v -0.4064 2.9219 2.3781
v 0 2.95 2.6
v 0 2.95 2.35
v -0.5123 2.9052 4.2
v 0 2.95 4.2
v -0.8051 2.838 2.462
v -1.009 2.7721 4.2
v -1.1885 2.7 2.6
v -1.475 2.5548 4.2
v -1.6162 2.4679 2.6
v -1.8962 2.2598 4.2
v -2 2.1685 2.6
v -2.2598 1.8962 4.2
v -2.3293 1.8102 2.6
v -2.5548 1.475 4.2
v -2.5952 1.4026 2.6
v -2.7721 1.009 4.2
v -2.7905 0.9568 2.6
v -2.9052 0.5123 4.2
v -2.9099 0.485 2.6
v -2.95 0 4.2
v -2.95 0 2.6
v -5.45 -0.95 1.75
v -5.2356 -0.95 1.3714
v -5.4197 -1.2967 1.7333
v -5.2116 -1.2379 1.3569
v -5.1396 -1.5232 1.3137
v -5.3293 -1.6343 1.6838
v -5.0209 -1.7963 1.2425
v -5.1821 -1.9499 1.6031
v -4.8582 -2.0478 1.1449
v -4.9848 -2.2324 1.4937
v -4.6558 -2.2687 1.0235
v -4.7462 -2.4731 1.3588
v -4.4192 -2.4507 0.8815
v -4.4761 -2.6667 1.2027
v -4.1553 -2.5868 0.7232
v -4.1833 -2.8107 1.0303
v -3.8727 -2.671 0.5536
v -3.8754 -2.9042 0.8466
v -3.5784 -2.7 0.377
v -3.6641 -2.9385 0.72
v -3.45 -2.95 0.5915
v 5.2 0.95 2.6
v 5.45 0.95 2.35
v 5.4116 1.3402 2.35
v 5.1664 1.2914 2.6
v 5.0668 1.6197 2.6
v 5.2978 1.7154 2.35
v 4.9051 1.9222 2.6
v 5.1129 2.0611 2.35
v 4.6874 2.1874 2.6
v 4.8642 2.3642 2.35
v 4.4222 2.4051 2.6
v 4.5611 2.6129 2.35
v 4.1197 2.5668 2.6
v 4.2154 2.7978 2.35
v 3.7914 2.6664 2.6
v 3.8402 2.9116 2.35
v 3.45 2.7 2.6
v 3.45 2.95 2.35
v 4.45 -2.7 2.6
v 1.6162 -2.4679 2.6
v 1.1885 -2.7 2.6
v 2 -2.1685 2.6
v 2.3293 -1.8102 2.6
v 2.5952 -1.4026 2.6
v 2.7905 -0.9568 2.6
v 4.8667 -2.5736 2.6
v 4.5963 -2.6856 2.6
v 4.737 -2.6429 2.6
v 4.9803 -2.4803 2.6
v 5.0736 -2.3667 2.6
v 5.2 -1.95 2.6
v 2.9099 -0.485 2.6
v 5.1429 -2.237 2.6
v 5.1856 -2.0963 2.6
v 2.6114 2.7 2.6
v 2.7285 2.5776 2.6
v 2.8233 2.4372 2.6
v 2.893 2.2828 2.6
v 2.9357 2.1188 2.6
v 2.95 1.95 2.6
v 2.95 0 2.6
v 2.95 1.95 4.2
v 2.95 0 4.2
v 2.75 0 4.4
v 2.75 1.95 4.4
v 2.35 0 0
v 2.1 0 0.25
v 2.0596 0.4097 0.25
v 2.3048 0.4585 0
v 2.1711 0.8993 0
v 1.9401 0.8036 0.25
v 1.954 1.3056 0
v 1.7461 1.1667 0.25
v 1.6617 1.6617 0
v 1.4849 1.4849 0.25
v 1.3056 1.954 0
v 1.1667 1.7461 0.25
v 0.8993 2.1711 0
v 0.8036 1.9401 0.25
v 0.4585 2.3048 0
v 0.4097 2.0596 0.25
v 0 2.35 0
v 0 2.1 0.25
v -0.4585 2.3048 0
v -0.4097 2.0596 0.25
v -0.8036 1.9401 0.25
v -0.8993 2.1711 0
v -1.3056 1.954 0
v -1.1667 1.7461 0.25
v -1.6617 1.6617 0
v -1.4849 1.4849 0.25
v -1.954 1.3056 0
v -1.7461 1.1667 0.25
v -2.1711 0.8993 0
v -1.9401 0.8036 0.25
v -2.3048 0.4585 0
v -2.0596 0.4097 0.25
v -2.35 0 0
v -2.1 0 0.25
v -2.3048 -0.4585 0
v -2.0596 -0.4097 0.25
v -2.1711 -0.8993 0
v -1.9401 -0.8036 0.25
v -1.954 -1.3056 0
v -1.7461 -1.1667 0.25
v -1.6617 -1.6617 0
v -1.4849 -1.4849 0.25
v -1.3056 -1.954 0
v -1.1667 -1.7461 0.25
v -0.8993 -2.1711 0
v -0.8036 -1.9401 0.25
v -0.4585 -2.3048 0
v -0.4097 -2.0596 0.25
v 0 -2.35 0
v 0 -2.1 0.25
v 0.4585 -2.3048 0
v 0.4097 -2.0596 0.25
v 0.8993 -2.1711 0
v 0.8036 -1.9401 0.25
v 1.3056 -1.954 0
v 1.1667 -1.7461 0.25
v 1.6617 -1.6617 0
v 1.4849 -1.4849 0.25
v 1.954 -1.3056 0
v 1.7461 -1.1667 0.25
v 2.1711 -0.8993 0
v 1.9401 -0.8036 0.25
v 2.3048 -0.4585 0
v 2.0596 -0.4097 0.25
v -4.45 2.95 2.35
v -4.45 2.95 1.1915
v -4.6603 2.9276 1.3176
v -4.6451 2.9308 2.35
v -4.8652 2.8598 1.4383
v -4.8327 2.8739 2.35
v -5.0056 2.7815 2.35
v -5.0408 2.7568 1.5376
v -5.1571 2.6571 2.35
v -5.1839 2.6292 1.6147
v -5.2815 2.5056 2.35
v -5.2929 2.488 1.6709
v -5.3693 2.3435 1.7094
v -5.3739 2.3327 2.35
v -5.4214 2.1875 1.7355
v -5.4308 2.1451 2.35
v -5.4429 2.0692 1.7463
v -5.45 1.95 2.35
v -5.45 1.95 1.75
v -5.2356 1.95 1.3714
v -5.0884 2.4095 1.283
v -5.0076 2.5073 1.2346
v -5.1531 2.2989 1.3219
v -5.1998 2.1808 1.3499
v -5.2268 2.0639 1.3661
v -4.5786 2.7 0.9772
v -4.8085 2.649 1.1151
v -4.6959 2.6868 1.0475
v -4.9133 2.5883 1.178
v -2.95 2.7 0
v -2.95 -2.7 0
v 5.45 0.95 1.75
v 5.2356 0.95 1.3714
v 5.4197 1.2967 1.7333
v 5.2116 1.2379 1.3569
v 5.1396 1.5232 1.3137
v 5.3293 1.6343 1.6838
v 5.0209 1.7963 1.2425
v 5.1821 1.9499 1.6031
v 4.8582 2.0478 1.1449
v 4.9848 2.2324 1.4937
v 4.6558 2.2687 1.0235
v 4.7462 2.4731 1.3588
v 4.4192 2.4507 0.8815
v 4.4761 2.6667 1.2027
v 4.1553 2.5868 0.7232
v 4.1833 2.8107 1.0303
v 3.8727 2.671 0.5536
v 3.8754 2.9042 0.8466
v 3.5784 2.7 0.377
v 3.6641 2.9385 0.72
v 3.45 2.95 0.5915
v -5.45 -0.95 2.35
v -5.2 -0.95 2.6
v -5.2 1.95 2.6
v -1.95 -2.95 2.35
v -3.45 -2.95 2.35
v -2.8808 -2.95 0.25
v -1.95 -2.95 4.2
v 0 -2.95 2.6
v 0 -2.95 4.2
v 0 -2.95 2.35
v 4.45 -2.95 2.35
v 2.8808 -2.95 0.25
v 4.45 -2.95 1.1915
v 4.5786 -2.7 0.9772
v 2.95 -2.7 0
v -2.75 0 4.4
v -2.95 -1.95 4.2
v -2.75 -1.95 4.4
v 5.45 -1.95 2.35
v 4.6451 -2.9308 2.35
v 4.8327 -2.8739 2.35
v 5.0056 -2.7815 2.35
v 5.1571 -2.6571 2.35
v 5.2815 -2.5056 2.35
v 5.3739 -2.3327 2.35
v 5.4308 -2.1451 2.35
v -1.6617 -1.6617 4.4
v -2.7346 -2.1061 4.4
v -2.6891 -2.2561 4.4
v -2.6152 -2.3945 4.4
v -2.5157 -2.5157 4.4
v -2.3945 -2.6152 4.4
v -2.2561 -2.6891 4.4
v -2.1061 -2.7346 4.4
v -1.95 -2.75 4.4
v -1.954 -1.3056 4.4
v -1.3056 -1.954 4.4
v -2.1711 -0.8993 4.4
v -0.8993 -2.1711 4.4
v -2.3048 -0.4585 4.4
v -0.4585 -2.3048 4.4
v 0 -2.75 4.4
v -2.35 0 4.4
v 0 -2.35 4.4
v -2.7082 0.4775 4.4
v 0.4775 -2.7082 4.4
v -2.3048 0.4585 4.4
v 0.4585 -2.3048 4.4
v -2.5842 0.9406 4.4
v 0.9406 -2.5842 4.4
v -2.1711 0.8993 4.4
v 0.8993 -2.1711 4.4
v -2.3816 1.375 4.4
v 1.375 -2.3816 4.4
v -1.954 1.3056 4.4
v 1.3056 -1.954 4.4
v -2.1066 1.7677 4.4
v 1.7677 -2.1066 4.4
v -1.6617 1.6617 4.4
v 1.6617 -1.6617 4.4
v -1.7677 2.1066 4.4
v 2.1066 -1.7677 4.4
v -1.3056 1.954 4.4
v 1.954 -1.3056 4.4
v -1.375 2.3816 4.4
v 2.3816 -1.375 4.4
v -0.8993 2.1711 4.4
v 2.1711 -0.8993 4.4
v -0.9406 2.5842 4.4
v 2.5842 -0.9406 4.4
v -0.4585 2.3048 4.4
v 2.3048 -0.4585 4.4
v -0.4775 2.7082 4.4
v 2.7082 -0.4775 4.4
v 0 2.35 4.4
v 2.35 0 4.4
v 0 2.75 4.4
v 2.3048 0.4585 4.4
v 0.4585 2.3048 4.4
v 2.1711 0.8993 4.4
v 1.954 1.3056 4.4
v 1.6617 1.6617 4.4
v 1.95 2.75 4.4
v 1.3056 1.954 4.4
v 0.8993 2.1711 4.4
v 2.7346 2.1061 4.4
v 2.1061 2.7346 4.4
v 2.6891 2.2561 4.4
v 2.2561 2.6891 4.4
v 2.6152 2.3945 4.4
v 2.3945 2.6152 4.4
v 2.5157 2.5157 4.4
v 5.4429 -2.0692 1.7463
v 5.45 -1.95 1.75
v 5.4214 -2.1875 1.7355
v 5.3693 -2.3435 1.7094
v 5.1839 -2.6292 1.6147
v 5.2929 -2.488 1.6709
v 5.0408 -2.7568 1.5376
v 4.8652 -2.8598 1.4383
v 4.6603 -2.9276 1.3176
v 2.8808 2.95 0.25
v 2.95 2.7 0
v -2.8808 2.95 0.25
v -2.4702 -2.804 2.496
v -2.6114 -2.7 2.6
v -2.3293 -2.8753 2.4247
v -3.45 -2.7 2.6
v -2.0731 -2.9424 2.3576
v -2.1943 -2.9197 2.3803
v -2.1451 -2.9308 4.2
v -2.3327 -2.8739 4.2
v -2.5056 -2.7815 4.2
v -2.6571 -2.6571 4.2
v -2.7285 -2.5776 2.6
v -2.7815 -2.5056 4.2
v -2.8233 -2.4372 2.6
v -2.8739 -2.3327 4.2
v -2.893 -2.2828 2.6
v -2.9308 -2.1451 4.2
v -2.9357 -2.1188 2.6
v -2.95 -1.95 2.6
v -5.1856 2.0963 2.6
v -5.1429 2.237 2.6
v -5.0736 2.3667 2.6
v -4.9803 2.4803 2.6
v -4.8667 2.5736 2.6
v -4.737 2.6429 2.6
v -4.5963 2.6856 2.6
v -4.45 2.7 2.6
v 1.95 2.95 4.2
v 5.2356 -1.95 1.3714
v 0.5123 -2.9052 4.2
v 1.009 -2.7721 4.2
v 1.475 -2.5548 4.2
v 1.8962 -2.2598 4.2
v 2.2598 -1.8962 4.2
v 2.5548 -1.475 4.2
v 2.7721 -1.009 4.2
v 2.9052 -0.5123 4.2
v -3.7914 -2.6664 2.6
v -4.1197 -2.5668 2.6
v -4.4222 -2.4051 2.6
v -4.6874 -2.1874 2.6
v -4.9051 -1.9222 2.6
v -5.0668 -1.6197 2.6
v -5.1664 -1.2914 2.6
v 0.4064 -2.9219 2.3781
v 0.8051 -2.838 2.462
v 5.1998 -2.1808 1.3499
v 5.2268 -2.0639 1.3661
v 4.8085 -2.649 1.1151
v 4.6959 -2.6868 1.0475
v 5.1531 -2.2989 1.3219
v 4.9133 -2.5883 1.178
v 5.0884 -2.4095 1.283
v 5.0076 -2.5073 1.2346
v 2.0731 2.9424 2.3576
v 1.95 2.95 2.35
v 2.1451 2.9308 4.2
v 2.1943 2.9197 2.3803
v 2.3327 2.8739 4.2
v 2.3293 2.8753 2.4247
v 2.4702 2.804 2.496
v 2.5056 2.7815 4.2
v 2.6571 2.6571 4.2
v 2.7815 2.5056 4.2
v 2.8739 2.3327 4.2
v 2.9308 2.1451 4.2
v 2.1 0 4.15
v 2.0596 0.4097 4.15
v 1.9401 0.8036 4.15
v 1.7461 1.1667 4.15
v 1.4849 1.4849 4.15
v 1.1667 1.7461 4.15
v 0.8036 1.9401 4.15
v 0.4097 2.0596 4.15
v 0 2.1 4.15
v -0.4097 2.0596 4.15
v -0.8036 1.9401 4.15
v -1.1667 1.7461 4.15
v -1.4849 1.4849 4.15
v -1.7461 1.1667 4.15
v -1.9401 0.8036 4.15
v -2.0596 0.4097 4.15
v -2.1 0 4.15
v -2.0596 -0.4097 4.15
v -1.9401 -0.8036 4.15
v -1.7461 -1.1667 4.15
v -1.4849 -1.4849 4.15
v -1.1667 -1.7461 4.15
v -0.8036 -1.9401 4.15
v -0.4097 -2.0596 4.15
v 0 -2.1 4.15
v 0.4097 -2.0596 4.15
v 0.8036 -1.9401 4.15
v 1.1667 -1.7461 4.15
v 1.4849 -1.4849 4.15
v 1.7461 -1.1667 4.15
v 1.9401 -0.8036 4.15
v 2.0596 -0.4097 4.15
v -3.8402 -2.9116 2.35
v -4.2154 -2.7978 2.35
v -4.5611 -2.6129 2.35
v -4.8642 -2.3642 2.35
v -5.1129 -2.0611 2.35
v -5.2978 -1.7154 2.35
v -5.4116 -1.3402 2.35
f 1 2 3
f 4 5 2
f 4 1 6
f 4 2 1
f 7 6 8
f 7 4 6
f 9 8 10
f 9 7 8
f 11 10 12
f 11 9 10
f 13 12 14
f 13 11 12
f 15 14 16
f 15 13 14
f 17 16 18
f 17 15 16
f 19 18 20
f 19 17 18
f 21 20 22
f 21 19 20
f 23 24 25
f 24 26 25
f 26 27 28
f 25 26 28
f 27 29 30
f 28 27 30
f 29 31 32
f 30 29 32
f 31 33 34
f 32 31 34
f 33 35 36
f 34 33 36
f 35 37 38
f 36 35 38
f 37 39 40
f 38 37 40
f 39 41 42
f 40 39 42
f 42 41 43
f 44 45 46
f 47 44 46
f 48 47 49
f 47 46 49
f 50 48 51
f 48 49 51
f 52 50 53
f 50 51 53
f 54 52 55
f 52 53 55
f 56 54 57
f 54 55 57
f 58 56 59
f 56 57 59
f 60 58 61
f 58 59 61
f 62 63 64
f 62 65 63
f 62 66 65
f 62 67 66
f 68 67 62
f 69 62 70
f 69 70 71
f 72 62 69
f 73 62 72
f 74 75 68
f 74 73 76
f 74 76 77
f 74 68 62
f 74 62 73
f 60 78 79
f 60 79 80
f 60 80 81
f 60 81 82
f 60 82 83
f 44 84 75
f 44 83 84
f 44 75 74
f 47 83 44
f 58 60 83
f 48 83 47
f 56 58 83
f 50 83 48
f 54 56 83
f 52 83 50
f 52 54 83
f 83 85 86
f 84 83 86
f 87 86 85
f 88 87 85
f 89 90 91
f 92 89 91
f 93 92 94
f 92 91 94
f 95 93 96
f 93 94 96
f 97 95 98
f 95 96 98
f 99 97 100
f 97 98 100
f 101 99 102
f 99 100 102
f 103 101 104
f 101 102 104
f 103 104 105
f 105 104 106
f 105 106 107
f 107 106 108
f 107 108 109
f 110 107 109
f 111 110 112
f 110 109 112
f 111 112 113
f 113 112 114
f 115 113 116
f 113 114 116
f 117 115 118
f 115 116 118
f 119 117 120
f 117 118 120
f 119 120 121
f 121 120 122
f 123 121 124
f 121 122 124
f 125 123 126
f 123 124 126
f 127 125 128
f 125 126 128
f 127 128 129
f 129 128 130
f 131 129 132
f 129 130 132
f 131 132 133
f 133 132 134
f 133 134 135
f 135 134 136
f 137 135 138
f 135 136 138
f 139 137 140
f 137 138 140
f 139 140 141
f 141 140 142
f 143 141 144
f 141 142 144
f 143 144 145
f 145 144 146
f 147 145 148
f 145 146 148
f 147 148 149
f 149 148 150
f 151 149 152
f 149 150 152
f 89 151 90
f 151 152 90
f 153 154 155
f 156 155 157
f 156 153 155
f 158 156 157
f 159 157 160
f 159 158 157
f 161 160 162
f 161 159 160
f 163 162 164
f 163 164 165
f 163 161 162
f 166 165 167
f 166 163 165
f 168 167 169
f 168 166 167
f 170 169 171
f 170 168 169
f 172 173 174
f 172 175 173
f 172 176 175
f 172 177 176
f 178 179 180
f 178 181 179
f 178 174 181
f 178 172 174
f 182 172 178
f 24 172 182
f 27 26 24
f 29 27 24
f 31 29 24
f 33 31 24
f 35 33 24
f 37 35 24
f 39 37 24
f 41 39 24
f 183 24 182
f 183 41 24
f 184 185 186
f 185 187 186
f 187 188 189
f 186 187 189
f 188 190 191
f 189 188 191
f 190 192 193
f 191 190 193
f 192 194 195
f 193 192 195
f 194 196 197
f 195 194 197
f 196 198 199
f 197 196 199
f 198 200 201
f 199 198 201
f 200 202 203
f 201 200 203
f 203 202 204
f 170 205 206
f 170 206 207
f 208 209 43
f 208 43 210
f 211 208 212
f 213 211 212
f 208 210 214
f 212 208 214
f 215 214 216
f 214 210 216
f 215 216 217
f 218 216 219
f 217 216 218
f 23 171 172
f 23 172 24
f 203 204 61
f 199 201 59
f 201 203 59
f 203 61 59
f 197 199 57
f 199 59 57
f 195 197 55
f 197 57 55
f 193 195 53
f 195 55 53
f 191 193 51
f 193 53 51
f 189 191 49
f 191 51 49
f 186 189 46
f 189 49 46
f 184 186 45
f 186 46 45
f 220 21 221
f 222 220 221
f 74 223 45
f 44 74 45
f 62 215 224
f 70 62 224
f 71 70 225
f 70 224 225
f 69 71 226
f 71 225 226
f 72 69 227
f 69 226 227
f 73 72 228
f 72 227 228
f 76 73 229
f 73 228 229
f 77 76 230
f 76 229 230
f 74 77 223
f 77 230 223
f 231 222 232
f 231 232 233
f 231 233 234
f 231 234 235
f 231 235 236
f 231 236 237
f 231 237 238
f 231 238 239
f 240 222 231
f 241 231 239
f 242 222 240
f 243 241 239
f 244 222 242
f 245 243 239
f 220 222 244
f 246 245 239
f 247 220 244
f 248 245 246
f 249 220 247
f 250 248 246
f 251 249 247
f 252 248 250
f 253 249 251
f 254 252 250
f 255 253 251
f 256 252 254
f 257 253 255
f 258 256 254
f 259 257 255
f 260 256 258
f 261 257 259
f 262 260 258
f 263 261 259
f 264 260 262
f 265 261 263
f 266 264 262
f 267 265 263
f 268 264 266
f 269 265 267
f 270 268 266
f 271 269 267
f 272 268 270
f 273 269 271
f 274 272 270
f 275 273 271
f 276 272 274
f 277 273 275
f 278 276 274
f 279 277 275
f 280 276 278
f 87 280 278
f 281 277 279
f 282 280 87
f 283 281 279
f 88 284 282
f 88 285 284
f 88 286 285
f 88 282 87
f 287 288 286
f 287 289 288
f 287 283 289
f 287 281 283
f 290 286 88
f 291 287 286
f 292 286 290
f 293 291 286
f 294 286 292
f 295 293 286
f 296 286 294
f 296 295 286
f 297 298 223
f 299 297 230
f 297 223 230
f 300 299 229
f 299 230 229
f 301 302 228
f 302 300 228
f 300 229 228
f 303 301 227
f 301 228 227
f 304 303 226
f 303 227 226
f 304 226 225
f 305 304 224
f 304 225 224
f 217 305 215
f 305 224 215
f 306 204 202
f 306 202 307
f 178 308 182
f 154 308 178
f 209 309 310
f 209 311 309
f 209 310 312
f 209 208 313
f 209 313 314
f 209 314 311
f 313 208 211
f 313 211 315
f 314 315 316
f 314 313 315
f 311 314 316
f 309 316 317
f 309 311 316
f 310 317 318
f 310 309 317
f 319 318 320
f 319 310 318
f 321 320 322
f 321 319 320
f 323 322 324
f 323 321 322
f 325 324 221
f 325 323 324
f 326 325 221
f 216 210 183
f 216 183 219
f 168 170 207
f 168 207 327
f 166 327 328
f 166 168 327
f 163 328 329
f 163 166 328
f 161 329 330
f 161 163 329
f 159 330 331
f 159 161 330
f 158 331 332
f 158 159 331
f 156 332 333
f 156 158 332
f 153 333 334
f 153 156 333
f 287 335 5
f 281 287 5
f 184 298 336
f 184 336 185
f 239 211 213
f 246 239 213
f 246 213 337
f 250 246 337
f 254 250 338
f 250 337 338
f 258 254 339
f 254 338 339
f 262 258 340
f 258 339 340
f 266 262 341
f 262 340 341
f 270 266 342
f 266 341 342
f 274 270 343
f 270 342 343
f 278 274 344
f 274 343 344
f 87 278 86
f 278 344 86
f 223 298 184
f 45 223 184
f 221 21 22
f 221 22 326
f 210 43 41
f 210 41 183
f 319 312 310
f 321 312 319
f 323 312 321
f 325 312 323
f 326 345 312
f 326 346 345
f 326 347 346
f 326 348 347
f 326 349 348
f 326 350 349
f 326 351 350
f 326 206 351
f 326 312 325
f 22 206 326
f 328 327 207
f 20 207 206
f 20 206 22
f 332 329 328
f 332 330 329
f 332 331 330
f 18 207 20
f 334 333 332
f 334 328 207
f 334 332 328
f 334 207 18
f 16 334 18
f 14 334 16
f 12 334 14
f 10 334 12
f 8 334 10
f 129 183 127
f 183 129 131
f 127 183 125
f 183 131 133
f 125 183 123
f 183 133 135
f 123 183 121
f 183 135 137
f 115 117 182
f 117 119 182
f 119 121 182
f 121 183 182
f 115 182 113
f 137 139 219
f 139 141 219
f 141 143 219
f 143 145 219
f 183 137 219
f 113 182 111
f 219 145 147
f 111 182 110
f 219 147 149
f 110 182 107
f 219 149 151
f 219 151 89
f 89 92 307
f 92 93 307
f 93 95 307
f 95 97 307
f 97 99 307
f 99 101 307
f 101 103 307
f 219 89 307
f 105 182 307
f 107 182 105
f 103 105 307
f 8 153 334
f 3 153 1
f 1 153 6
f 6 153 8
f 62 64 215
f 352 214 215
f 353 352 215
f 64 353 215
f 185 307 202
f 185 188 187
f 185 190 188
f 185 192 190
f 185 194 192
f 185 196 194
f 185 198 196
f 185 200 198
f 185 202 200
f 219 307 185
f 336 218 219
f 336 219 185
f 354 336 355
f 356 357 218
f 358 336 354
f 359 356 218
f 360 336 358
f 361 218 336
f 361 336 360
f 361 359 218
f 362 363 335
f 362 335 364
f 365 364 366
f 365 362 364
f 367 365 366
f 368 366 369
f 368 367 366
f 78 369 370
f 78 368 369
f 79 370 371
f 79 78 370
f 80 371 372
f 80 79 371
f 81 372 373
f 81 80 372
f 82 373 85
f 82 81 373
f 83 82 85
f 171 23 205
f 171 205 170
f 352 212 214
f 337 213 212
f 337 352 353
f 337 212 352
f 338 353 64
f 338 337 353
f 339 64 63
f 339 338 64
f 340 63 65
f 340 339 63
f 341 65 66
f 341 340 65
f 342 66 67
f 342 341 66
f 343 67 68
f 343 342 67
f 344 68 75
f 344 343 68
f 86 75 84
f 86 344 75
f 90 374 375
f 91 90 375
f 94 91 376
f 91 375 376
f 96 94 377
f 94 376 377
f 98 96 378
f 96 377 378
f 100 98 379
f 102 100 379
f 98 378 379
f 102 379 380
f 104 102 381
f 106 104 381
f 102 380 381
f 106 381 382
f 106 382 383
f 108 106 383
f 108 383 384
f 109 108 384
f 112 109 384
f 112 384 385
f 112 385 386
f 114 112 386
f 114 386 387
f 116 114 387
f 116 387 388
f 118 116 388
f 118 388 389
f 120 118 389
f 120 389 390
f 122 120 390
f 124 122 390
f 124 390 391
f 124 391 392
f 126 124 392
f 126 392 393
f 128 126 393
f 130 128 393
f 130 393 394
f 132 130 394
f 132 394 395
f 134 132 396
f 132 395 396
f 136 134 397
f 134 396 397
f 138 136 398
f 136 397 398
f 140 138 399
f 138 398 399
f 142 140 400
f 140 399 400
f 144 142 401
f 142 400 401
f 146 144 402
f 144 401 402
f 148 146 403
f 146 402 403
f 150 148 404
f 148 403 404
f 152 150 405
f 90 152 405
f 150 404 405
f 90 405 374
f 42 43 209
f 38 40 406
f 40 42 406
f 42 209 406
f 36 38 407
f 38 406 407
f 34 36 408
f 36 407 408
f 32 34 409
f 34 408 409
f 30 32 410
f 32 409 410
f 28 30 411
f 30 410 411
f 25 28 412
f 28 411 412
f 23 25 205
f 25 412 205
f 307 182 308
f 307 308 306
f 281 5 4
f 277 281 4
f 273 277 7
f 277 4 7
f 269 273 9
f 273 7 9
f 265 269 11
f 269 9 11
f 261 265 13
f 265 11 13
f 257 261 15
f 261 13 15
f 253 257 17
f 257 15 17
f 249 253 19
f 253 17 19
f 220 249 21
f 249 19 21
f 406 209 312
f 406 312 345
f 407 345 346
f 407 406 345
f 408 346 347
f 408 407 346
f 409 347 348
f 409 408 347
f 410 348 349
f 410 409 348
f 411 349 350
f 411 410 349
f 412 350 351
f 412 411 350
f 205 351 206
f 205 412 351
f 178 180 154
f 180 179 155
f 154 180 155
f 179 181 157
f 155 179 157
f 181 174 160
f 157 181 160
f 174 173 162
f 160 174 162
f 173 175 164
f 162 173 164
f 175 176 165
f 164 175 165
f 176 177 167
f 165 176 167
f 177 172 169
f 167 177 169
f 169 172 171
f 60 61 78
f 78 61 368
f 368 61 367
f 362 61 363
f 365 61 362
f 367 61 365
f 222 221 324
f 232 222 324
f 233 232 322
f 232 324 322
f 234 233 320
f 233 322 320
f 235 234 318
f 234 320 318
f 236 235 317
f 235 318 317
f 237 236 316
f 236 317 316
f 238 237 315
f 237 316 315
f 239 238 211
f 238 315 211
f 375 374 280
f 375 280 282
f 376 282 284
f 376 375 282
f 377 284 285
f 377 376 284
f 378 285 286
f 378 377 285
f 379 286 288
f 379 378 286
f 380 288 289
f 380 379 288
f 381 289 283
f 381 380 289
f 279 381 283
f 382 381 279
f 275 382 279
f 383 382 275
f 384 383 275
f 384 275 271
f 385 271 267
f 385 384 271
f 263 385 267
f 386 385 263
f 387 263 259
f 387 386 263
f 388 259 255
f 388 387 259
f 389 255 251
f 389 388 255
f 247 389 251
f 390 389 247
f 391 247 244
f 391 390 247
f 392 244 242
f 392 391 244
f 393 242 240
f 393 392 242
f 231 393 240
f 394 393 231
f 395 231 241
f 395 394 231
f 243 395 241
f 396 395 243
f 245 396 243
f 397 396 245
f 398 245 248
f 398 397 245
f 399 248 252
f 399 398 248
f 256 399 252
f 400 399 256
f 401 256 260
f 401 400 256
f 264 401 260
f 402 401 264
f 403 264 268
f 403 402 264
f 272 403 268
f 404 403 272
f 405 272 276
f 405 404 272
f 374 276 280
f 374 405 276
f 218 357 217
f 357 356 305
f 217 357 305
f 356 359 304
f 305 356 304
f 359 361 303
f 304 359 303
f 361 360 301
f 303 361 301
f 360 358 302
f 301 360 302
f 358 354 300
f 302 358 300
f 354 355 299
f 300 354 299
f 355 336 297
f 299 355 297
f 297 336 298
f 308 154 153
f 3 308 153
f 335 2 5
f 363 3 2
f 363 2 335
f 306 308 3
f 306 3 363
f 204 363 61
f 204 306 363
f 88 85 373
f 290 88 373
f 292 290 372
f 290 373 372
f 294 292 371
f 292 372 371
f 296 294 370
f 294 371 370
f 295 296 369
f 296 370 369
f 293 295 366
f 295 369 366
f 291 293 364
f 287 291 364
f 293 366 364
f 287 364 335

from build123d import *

# Parameters (mm, degrees)
SKETCH_W        = 10.9
SKETCH_H        = 5.9
PAD_DEPTH       = 4.4
SKETCH001_R     = 2.1
HOLE_DEPTH      = 25
SKETCH002_W     = 13.975575
SKETCH002_H     = 8.81763
POCKET_DEPTH    = 1.8
FILLET_R        = 1
FILLET001_R     = 2
FILLET002_R     = 1
POCKET001_DEPTH = 5.901
CHAMFER_SIZE    = 0.25
CHAMFER001_SIZE = 0.2
CHAMFER002_SIZE = 0.25
CHAMFER003_SIZE = 0.25


with BuildPart() as part:
    # Sketch → Pad (new body)
    with BuildSketch(Plane.XY):
        Rectangle(SKETCH_W, SKETCH_H)
    extrude(amount=PAD_DEPTH)

    # Sketch001 (on Face6 of Pad) → Hole (cut)
    with BuildSketch(Plane.XY.offset(4.4)):
        Circle(SKETCH001_R)
    extrude(amount=-HOLE_DEPTH, mode=Mode.SUBTRACT)

    # Sketch002 (on Face5 of Hole) → Pocket (cut)
    with BuildSketch(Plane.XY.offset(4.4)):
        with Locations((0.08922, 0.089121)):
            Rectangle(SKETCH002_W, SKETCH002_H)
        with BuildLine():
            ThreePointArc((0, 2.95), (-2.085965, 2.085965), (-2.95, 0))
            Line((-2.95, 0), (-2.95, -2.95))
            Line((-2.95, -2.95), (0, -2.95))
            ThreePointArc((0, -2.95), (2.085965, -2.085965), (2.95, 0))
            Line((2.95, 2.95), (2.95, 0))
            Line((0, 2.95), (2.95, 2.95))
        make_face(mode=Mode.SUBTRACT)
    extrude(amount=-POCKET_DEPTH, mode=Mode.SUBTRACT)

    # Fillet
    fillet_edges = [part.edges().sort_by_distance(p)[0] for p in [
        (2.95, 2.95, 3.5),
        (-2.95, -2.95, 3.5),
    ]]
    fillet(fillet_edges, radius=FILLET_R)

    # Fillet001
    fillet001_edges = [part.edges().sort_by_distance(p)[0] for p in [
        (5.45, 2.95, 1.3),
        (-5.45, -2.95, 1.3),
    ]]
    fillet(fillet001_edges, radius=FILLET001_R)

    # Fillet002
    fillet002_edges = [part.edges().sort_by_distance(p)[0] for p in [
        (5.45, -2.95, 1.3),
        (-5.45, 2.95, 1.3),
    ]]
    fillet(fillet002_edges, radius=FILLET002_R)

    # Sketch003 (on Face5 of Fillet002) → Pocket001 (cut, through all)
    with BuildSketch(Plane.XZ.offset(2.95)):
        Polygon((-5.45, 1.5), (-2.95, 0), (-5.45, 0), align=None)
        Polygon((5.45, 1.5), (5.45, 0), (2.95, 0), align=None)
    extrude(amount=-POCKET001_DEPTH, mode=Mode.SUBTRACT)

    # Chamfer
    chamfer_edges = [part.edges().sort_by_distance(p)[0] for p in [
        (-2.1, 0, 0),
        (-2.1, 0, 4.4),
    ]]
    chamfer(chamfer_edges, length=CHAMFER_SIZE)

    # Chamfer001
    chamfer001_edges = [part.edges().sort_by_distance(p)[0] for p in [
        (-2.95, -0.975, 4.4),
    ]]
    chamfer(chamfer001_edges, length=CHAMFER001_SIZE)

    # Chamfer002
    chamfer002_edges = [part.edges().sort_by_distance(p)[0] for p in [
        (0, -2.95, 0),
        (3.7, -2.95, 0.45),
        (-3.2, -2.95, 0.15),
        (0, 2.95, 0),
    ]]
    chamfer(chamfer002_edges, length=CHAMFER002_SIZE)

    # Chamfer003
    chamfer003_edges = [part.edges().sort_by_distance(p)[0] for p in [
        (-4.864214, -2.364214, 2.6),
        (2.225, -2.95, 2.6),
    ]]
    chamfer(chamfer003_edges, length=CHAMFER003_SIZE)


solid = part.part
